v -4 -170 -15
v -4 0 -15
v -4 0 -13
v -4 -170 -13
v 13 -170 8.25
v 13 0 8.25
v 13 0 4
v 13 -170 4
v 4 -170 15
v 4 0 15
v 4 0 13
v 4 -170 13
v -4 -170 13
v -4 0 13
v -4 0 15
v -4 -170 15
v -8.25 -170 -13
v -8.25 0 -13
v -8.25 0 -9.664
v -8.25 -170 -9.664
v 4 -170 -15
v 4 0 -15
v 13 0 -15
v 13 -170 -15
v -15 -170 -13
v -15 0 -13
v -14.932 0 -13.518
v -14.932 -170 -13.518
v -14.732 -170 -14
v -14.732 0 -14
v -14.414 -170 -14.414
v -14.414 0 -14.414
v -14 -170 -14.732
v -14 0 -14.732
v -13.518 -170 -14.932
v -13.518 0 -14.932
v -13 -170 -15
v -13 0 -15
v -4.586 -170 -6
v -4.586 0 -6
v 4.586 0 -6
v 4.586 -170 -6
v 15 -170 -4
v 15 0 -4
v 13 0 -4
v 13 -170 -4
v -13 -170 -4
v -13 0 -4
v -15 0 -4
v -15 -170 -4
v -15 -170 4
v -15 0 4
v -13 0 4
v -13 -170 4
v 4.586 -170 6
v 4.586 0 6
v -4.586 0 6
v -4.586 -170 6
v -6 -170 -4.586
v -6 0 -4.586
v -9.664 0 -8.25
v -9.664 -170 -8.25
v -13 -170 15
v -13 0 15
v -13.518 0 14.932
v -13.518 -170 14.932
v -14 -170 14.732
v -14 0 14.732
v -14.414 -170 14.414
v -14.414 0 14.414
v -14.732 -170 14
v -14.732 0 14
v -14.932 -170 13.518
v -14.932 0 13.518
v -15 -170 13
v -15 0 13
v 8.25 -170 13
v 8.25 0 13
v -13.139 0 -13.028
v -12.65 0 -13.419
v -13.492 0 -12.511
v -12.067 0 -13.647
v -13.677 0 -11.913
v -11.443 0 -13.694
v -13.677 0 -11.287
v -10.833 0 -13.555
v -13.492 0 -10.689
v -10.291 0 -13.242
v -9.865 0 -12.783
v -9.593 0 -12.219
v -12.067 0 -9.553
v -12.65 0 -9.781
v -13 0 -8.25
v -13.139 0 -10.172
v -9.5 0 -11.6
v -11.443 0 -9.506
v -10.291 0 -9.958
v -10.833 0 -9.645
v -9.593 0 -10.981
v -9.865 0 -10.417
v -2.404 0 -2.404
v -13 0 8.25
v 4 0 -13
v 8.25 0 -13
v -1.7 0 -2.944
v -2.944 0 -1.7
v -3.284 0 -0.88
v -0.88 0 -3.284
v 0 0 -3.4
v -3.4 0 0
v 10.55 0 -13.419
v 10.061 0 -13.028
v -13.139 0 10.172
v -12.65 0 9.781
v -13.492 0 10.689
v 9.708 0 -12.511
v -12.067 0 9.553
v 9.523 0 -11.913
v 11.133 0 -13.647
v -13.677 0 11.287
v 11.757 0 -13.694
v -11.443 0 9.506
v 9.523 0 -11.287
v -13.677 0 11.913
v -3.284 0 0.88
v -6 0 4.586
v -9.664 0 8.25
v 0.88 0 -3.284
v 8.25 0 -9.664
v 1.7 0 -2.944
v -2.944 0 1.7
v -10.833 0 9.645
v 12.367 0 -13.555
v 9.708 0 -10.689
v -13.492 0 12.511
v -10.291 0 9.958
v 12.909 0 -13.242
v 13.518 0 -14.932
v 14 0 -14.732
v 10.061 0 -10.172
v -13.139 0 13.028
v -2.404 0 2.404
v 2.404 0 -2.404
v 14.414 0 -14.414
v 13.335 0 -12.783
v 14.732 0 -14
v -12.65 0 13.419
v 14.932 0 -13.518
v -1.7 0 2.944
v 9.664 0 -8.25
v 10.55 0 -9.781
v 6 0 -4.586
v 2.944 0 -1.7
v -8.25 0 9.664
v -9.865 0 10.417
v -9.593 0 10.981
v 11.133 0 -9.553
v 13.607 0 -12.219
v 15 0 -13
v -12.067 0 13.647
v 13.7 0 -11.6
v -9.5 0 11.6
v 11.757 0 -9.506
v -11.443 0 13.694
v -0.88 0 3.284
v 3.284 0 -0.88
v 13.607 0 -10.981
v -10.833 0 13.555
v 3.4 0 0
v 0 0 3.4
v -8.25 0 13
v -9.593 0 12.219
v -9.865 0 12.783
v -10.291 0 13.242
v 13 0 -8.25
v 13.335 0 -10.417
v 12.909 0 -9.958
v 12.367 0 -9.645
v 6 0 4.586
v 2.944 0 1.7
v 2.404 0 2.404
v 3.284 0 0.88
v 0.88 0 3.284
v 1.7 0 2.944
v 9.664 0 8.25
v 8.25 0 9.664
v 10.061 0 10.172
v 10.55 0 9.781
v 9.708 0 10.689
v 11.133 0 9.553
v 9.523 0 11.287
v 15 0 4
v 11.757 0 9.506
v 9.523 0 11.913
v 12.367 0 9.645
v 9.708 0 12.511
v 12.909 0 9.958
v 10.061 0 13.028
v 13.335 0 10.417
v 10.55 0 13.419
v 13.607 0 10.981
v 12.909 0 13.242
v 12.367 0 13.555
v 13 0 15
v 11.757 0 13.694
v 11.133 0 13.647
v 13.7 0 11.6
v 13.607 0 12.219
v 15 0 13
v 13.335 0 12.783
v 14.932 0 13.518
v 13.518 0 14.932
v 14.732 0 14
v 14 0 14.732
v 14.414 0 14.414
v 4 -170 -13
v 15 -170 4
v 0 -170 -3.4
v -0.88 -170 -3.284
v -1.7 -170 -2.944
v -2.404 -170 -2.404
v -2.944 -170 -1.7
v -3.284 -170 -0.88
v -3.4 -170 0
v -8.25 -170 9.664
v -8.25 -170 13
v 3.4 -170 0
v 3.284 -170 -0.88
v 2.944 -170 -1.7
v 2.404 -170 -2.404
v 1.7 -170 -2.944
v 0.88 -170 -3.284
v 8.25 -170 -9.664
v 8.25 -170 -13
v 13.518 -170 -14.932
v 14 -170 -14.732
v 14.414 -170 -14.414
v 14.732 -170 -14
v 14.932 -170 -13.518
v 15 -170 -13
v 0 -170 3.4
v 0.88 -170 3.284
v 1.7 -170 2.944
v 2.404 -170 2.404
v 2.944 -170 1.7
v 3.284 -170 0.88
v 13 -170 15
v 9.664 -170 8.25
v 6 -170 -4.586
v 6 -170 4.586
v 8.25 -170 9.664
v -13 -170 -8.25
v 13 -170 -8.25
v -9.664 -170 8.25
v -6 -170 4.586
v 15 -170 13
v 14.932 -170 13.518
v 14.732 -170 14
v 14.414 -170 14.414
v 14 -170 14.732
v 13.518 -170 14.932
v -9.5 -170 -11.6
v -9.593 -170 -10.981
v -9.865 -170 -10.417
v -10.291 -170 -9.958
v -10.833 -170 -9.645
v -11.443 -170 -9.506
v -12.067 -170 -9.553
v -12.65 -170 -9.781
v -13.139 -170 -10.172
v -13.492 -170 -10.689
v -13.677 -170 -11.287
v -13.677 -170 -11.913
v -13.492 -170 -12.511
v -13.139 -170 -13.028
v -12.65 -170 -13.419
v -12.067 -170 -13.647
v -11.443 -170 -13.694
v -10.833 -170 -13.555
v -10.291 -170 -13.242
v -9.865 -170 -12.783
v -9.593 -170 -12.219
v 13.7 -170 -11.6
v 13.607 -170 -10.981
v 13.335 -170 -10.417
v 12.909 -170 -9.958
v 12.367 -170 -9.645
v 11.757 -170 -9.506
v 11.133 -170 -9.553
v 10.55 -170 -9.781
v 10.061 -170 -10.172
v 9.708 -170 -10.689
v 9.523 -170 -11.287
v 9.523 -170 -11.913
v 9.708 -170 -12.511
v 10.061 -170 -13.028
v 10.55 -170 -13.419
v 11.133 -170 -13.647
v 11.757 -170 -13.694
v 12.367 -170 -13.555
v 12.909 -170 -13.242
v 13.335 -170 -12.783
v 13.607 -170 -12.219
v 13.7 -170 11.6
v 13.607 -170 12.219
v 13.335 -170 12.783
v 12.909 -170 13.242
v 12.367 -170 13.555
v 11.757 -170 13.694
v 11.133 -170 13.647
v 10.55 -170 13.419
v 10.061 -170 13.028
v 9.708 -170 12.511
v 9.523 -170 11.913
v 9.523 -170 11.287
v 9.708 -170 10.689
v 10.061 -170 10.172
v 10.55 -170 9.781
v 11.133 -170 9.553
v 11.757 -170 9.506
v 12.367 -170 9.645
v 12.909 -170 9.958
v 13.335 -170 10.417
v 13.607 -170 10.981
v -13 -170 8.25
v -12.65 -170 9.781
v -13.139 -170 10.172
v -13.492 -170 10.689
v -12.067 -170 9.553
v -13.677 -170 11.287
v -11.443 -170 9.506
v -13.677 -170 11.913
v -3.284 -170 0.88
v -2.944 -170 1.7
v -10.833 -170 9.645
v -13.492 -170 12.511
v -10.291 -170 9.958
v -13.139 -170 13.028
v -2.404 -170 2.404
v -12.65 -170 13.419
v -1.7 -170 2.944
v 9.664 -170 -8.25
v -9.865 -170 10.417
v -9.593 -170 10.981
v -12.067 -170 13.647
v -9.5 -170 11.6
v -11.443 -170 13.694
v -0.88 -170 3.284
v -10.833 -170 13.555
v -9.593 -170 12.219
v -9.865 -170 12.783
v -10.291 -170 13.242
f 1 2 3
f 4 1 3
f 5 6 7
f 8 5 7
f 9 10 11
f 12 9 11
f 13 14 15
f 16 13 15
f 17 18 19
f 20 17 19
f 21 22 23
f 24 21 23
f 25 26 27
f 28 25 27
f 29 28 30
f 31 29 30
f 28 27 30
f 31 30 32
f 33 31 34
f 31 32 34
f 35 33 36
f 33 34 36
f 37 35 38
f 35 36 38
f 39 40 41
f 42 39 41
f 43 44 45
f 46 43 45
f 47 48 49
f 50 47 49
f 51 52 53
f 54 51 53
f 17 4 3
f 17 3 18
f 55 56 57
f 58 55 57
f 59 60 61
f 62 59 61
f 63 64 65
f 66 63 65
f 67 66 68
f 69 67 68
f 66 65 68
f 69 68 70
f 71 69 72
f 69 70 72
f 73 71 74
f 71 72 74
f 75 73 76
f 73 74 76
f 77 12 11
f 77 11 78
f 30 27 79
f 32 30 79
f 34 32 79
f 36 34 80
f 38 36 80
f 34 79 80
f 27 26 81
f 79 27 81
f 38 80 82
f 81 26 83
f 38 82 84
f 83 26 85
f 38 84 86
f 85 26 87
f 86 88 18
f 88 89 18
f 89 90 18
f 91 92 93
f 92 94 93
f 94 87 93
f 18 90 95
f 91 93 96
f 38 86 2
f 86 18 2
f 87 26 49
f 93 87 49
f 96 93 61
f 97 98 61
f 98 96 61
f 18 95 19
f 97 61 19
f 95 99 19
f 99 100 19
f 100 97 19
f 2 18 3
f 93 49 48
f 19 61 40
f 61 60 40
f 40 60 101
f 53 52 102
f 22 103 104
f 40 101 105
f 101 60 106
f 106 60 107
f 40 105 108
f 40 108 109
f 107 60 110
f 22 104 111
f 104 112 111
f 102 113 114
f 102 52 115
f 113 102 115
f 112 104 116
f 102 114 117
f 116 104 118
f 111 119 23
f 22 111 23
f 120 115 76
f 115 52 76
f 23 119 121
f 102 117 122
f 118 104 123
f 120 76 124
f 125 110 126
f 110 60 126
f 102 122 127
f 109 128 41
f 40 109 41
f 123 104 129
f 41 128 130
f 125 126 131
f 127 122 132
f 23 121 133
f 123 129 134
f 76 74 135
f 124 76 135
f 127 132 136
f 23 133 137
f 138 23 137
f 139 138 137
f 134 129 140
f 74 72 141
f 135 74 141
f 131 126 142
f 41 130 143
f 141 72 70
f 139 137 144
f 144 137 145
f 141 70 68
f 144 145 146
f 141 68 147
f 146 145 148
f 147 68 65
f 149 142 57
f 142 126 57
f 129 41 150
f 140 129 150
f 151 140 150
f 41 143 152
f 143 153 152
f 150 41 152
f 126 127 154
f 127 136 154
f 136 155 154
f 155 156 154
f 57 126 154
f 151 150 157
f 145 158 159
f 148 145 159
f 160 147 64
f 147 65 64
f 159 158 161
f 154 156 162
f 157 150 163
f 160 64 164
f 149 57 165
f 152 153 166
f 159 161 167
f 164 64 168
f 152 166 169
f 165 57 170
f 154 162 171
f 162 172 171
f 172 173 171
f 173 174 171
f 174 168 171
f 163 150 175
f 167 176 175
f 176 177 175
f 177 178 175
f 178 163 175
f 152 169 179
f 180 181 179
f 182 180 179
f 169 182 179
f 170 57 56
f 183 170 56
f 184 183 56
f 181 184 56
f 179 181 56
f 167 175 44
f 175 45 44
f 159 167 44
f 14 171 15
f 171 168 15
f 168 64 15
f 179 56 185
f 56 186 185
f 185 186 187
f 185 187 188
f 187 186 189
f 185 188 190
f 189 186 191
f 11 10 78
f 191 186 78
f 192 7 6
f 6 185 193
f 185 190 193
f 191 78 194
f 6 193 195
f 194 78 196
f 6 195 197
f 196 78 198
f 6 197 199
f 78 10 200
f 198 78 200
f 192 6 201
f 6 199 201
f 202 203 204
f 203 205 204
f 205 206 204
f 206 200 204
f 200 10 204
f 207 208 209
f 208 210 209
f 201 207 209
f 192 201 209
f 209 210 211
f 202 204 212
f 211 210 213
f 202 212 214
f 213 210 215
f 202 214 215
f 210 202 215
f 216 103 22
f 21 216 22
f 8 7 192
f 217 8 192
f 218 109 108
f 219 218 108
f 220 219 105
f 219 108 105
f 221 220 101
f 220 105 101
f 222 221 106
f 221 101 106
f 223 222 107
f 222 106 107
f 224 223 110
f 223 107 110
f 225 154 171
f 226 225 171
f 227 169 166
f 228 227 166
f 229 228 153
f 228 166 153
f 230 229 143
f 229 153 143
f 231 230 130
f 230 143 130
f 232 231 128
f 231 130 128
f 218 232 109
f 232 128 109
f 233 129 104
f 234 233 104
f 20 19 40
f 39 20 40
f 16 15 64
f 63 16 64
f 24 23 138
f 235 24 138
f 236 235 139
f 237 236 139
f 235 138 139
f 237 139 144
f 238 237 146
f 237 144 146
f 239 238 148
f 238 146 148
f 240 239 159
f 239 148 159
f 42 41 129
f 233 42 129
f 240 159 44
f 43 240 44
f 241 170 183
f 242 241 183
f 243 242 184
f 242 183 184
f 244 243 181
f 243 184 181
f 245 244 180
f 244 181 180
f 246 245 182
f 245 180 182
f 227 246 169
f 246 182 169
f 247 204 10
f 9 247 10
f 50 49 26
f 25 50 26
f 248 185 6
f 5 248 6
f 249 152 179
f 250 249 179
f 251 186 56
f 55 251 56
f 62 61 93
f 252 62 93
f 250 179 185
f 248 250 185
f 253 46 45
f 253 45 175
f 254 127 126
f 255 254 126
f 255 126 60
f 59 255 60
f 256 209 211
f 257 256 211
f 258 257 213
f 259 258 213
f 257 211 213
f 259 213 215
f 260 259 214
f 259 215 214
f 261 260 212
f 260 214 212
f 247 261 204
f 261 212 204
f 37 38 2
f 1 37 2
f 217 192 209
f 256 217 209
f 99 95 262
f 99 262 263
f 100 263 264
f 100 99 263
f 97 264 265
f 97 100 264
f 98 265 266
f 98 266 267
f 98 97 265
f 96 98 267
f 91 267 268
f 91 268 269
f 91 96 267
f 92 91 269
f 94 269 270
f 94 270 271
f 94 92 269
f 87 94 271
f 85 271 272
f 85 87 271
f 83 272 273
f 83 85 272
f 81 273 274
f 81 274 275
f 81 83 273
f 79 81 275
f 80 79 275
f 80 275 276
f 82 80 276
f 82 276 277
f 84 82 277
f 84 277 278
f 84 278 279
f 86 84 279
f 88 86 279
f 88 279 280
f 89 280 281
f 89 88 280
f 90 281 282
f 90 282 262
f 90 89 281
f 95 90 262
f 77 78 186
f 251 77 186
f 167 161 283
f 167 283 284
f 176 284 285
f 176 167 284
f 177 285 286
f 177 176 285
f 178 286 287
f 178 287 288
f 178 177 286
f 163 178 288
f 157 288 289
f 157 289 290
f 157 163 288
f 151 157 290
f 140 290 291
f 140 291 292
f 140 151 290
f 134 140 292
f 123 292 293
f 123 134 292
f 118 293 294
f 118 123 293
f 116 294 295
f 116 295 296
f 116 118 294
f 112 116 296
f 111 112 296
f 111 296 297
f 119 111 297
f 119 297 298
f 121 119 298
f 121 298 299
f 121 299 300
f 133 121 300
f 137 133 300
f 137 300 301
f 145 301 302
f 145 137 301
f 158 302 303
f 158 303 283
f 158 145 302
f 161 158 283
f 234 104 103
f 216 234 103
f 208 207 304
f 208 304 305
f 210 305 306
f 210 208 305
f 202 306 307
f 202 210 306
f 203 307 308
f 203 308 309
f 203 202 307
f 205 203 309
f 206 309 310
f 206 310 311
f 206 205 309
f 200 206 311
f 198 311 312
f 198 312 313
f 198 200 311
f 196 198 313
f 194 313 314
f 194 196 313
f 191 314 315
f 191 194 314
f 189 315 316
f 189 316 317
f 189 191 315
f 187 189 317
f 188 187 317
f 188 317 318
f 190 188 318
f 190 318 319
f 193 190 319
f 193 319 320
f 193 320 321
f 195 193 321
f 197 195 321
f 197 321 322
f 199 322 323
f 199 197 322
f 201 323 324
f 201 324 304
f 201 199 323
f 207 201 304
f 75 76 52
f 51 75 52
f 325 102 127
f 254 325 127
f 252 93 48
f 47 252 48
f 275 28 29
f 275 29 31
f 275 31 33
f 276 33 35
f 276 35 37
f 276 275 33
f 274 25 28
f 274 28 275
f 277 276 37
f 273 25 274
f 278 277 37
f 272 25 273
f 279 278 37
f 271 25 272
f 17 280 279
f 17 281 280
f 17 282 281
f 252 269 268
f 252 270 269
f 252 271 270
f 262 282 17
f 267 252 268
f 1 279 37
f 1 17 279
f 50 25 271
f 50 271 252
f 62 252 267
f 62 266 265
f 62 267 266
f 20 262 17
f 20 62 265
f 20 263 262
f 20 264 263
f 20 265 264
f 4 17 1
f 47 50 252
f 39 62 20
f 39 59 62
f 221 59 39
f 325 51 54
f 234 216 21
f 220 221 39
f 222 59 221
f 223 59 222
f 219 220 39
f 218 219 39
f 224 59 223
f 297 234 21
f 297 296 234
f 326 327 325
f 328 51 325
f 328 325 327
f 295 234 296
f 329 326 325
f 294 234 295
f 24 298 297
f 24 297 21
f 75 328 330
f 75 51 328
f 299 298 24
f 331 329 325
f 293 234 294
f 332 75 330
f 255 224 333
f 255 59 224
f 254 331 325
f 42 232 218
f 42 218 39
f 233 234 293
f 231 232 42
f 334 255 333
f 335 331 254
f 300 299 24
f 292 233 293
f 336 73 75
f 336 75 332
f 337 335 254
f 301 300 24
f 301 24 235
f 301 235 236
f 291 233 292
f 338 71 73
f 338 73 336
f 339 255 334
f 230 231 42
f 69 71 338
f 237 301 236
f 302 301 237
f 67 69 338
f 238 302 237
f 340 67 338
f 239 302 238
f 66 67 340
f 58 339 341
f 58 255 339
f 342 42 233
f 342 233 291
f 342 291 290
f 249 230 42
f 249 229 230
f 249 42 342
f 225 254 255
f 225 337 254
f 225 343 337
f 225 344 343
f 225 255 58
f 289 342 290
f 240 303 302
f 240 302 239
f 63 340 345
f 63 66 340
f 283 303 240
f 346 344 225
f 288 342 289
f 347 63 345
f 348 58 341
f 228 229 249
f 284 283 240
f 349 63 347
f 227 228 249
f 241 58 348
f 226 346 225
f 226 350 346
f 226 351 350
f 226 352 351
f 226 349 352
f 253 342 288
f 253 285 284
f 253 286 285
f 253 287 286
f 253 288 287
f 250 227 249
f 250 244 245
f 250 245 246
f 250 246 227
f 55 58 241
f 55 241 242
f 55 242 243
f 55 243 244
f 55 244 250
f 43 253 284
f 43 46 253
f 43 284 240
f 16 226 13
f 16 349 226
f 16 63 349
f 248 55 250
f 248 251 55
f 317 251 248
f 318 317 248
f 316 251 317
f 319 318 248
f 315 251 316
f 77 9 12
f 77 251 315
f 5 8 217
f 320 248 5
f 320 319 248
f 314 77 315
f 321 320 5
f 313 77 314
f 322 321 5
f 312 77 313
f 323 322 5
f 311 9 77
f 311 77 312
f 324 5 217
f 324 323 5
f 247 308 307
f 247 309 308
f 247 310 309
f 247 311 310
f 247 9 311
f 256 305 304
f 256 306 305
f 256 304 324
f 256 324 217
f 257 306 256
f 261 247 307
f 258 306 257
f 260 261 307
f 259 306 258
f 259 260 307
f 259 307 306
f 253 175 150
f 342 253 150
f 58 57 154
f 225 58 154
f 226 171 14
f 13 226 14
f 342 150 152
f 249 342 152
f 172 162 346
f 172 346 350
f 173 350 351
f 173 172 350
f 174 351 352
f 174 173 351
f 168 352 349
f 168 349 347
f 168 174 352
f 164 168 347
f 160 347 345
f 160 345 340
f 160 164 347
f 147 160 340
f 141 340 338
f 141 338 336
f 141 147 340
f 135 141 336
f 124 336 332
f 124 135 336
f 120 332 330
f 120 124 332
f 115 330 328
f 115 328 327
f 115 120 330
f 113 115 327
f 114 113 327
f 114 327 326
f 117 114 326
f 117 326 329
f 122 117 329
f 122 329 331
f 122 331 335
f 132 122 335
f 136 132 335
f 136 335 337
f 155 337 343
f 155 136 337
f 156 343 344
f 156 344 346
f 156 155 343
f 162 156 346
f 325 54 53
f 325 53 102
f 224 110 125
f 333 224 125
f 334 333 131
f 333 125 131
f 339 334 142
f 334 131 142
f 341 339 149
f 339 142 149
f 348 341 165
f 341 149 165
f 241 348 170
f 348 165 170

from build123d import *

# Parameters (mm, degrees)
F0_R     = 2.1
F1_DEPTH = 170


with BuildPart() as f1:
    # F0 (on Front) → F1 (new body)
    with BuildSketch(Plane.XZ):
        with BuildLine():
            Line((4.585786, 6), (0, 6))
            Line((0, 6), (-4.585786, 6))
            Line((-4.585786, 6), (-8.25, 9.664214))
            Line((-8.25, 9.664214), (-8.25, 13))
            Line((-8.25, 13), (-4, 13))
            Line((-4, 13), (-4, 15))
            Line((-4, 15), (-13, 15))
            ThreePointArc((-13, 15), (-14.414214, 14.414214), (-15, 13))
            Line((-15, 13), (-15, 4))
            Line((-15, 4), (-13, 4))
            Line((-13, 4), (-13, 8.25))
            Line((-13, 8.25), (-9.664214, 8.25))
            Line((-9.664214, 8.25), (-6, 4.585786))
            Line((-6, 4.585786), (-6, 0))
            Line((-6, 0), (-6, -4.585786))
            Line((-6, -4.585786), (-9.664214, -8.25))
            Line((-9.664214, -8.25), (-13, -8.25))
            Line((-13, -8.25), (-13, -4))
            Line((-13, -4), (-15, -4))
            Line((-15, -4), (-15, -13))
            ThreePointArc((-15, -13), (-14.414214, -14.414214), (-13, -15))
            Line((-13, -15), (-4, -15))
            Line((-4, -15), (-4, -13))
            Line((-4, -13), (-8.25, -13))
            Line((-8.25, -13), (-8.25, -9.664214))
            Line((-8.25, -9.664214), (-4.585786, -6))
            Line((-4.585786, -6), (0, -6))
            Line((0, -6), (4.585786, -6))
            Line((4.585786, -6), (8.25, -9.664214))
            Line((8.25, -9.664214), (8.25, -13))
            Line((8.25, -13), (4, -13))
            Line((4, -13), (4, -15))
            Line((4, -15), (13, -15))
            ThreePointArc((13, -15), (14.414214, -14.414214), (15, -13))
            Line((15, -13), (15, -4))
            Line((15, -4), (13, -4))
            Line((13, -4), (13, -8.25))
            Line((13, -8.25), (9.664214, -8.25))
            Line((9.664214, -8.25), (6, -4.585786))
            Line((6, -4.585786), (6, 0))
            Line((6, 0), (6, 4.585786))
            Line((6, 4.585786), (9.664214, 8.25))
            Line((9.664214, 8.25), (13, 8.25))
            Line((13, 8.25), (13, 4))
            Line((13, 4), (15, 4))
            Line((15, 4), (15, 13))
            ThreePointArc((15, 13), (14.414214, 14.414214), (13, 15))
            Line((13, 15), (4, 15))
            Line((4, 15), (4, 13))
            Line((4, 13), (8.25, 13))
            Line((8.25, 13), (8.25, 9.664214))
            Line((8.25, 9.664214), (4.585786, 6))
        make_face()
        with Locations((-11.6, -11.6)):
            Circle(F0_R, mode=Mode.SUBTRACT)
        with Locations((11.6, -11.6)):
            Circle(F0_R, mode=Mode.SUBTRACT)
        with Locations((-11.6, 11.6)):
            Circle(F0_R, mode=Mode.SUBTRACT)
        with BuildLine():
            ThreePointArc((-3.4, 0), (-2.404163, 2.404163), (0, 3.4))
            ThreePointArc((0, 3.4), (2.404163, 2.404163), (3.4, 0))
            ThreePointArc((3.4, 0), (2.404163, -2.404163), (0, -3.4))
            ThreePointArc((0, -3.4), (-2.404163, -2.404163), (-3.4, 0))
        make_face(mode=Mode.SUBTRACT)
        with Locations((11.6, 11.6)):
            Circle(F0_R, mode=Mode.SUBTRACT)
    extrude(amount=F1_DEPTH)


solid = f1.part
